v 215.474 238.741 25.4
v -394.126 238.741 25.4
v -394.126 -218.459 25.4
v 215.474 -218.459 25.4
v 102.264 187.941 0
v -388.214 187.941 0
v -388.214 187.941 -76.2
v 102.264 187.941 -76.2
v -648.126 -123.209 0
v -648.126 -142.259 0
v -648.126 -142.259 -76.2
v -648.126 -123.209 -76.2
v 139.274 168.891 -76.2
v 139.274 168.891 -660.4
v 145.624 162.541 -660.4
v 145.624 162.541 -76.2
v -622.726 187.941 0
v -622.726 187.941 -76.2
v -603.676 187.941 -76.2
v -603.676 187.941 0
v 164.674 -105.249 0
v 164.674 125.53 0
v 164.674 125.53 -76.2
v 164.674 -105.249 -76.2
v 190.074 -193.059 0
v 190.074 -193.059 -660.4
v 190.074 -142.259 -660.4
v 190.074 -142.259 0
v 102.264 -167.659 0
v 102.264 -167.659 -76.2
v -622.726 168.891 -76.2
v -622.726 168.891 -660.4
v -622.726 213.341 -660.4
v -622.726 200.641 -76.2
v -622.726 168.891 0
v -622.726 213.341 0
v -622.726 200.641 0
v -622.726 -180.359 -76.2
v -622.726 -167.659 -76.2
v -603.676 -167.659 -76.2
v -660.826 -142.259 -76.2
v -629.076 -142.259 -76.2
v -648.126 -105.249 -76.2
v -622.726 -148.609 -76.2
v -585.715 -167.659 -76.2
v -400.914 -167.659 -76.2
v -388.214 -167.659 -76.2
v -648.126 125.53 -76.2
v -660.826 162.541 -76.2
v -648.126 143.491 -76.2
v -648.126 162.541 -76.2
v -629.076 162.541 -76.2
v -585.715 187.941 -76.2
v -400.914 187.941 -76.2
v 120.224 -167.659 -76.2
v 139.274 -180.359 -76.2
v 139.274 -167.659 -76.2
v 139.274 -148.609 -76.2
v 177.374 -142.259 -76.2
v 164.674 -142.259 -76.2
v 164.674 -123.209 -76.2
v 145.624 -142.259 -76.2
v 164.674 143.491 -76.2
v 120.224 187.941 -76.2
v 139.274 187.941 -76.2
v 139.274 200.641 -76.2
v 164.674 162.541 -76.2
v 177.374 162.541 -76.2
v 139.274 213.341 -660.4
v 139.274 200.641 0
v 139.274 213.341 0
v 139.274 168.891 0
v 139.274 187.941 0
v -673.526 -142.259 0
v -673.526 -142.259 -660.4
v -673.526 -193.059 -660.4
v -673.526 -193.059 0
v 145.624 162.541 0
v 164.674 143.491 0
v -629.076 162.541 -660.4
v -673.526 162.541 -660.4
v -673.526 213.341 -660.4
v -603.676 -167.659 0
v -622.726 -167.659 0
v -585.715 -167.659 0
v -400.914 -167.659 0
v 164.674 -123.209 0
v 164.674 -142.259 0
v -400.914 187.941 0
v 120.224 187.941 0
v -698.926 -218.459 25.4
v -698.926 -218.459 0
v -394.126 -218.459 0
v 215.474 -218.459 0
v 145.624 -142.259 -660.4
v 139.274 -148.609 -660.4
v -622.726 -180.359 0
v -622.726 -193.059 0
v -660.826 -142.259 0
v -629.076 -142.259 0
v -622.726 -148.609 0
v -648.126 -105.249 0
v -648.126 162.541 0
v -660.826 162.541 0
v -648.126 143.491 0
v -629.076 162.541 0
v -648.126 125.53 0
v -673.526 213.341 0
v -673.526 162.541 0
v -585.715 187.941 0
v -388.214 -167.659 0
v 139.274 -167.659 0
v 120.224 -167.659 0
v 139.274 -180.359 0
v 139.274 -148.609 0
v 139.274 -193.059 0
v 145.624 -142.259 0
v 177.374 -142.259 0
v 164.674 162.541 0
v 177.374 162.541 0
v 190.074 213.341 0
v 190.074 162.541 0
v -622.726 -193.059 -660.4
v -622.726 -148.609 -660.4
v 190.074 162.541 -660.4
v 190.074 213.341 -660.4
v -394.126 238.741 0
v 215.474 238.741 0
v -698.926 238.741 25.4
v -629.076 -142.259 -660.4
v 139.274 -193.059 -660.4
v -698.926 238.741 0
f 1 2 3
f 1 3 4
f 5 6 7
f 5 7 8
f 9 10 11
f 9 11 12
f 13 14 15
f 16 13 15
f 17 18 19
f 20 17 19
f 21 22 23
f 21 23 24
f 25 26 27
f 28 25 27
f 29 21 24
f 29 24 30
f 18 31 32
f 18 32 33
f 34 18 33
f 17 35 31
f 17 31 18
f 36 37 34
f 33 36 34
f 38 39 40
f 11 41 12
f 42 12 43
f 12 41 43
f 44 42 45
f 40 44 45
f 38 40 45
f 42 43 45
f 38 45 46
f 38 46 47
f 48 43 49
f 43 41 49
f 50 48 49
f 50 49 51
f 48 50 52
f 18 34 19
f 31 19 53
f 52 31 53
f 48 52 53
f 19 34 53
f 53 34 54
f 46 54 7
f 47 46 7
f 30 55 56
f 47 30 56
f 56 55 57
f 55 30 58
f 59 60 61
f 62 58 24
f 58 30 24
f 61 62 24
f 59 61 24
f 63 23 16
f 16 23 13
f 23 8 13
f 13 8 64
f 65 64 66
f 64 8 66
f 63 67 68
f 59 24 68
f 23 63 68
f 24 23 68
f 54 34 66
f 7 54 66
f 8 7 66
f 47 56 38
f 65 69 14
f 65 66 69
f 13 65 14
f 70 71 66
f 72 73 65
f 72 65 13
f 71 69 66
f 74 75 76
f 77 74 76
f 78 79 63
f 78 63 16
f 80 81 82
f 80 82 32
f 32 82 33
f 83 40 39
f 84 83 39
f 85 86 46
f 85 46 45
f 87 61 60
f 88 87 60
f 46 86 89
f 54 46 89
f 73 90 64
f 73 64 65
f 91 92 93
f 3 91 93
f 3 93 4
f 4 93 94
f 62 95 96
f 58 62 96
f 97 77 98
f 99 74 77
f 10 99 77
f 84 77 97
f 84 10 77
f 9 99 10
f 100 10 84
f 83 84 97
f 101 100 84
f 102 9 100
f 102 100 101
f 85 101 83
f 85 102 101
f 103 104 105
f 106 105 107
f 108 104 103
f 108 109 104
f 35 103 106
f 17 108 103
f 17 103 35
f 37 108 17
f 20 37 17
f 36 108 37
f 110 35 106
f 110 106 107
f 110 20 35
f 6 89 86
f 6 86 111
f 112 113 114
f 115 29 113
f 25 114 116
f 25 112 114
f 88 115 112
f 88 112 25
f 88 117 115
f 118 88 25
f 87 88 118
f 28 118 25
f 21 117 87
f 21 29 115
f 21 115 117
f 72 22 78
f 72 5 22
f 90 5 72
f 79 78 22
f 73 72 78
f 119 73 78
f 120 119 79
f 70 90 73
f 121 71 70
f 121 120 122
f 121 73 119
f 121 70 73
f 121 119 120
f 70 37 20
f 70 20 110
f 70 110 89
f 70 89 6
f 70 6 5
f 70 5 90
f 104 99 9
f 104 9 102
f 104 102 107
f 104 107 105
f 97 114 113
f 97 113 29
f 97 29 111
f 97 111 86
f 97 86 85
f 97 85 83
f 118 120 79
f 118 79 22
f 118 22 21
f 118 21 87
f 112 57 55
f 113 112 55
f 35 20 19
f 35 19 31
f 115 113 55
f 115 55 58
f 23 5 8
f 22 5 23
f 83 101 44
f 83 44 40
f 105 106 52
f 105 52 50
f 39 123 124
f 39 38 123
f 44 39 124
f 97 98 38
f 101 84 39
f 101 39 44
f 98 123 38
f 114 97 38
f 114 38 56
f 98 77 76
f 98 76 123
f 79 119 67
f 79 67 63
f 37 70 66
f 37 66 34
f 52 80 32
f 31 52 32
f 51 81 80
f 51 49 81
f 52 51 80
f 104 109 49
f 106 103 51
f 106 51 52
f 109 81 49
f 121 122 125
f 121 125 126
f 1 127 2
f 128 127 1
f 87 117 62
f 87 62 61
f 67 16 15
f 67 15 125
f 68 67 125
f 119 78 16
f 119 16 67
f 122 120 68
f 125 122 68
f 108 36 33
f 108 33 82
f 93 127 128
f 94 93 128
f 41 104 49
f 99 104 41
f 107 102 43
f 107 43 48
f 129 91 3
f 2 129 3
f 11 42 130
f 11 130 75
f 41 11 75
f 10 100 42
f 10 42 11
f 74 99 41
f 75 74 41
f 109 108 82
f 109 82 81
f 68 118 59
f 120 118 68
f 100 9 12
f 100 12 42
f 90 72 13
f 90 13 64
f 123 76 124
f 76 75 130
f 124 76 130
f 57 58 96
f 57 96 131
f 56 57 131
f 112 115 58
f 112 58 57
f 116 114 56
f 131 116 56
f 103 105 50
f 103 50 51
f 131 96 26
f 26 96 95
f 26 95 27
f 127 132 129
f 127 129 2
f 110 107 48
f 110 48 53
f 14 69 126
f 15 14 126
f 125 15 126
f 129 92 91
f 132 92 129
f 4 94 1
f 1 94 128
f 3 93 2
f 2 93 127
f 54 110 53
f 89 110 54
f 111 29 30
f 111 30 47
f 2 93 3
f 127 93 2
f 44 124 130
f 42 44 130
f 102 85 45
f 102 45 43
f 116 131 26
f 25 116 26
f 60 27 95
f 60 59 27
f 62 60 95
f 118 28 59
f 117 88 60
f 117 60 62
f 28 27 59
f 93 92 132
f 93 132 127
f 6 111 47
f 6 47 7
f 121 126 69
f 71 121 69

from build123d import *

# Parameters (mm, degrees)
F0_W     = 609.6
F0_H     = 457.2
F1_DEPTH = 25.4
F0_W_2   = 304.8
F2_DEPTH = 25.4
F3_W     = 6.7882202148
F3_H     = 355.6
F3_W_2   = 5.9117797852
F4_DEPTH = 76.2
F5_DEPTH = 660.4


with BuildPart() as f1:
    # F0 (on Top) → F1 (new body)
    with BuildSketch(Plane.XY):
        with Locations((-89.3258527756, 10.1408557653)):
            Rectangle(F0_W, F0_H)
    extrude(amount=F1_DEPTH)


with BuildPart() as f2:
    # F0 (on Top) → F2 (new body)
    with BuildSketch(Plane.XY):
        with Locations((-546.5258527756, 10.1408557653)):
            Rectangle(F0_W_2, F0_H)
    extrude(amount=F2_DEPTH)


with BuildPart() as f4:
    # F3 (on face) → F4 (new body)
    with BuildSketch(Plane.XY):
        Polygon((-394.1258527756, -167.6591442347), (-394.1258527756, -180.3591442347), (139.2741472244, -180.3591442347), (139.2741472244, -167.6591442347), (120.2241472244, -167.6591442347), (102.2636349823, -167.6591442347), (-241.7258527756, -167.6591442347), (-388.2140729904, -167.6591442347), align=None)
        Polygon((-622.7258527756, -167.6591442347), (-622.7258527756, -180.3591442347), (-394.1258527756, -180.3591442347), (-394.1258527756, -167.6591442347), (-400.9140729904, -167.6591442347), (-585.7153405334, -167.6591442347), (-603.6758527756, -167.6591442347), align=None)
        Polygon((-622.7258527756, -142.2591442347), (-622.7258527756, -148.6091442347), (-603.6758527756, -167.6591442347), (-585.7153405334, -167.6591442347), (-648.1258527756, -105.2486319925), (-648.1258527756, -123.2091442347), (-629.0758527756, -142.2591442347), align=None)
        Polygon((-660.8258527756, 162.5408557653), (-660.8258527756, -142.2591442347), (-648.1258527756, -142.2591442347), (-648.1258527756, -123.2091442347), (-648.1258527756, -105.2486319925), (-648.1258527756, 125.5303435232), (-648.1258527756, 143.4908557653), (-648.1258527756, 162.5408557653), align=None)
        Polygon((-622.7258527756, 162.5408557653), (-629.0758527756, 162.5408557653), (-648.1258527756, 143.4908557653), (-648.1258527756, 125.5303435232), (-585.7153405334, 187.9408557653), (-603.6758527756, 187.9408557653), (-622.7258527756, 168.8908557653), align=None)
        Polygon((-400.9140729904, 187.9408557653), (-394.1258527756, 187.9408557653), (-394.1258527756, 200.6408557653), (-622.7258527756, 200.6408557653), (-622.7258527756, 187.9408557653), (-603.6758527756, 187.9408557653), (-585.7153405334, 187.9408557653), align=None)
        Polygon((-394.1258527756, 200.6408557653), (-394.1258527756, 187.9408557653), (-388.2140729904, 187.9408557653), (102.2636349823, 187.9408557653), (120.2241472244, 187.9408557653), (139.2741472244, 187.9408557653), (139.2741472244, 200.6408557653), align=None)
        Polygon((120.2241472244, 187.9408557653), (102.2636349823, 187.9408557653), (164.6741472244, 125.5303435232), (164.6741472244, 143.4908557653), (145.6241472244, 162.5408557653), (139.2741472244, 162.5408557653), (139.2741472244, 168.8908557653), align=None)
        Polygon((164.6741472244, -142.2591442347), (177.3741472244, -142.2591442347), (177.3741472244, 162.5408557653), (164.6741472244, 162.5408557653), (164.6741472244, 143.4908557653), (164.6741472244, 125.5303435232), (164.6741472244, -105.2486319925), (164.6741472244, -123.2091442347), align=None)
        Polygon((-629.0758527756, -142.2591442347), (-622.7258527756, -148.6091442347), (-622.7258527756, -142.2591442347), align=None)
        Polygon((-622.7258527756, 168.8908557653), (-629.0758527756, 162.5408557653), (-622.7258527756, 162.5408557653), align=None)
        Polygon((145.6241472244, 162.5408557653), (139.2741472244, 168.8908557653), (139.2741472244, 162.5408557653), align=None)
        Polygon((139.2741472244, -142.2591442347), (139.2741472244, -148.6091442347), (145.6241472244, -142.2591442347), align=None)
        Polygon((120.2241472244, -167.6591442347), (139.2741472244, -148.6091442347), (139.2741472244, -142.2591442347), (145.6241472244, -142.2591442347), (164.6741472244, -123.2091442347), (164.6741472244, -105.2486319925), (102.2636349823, -167.6591442347), align=None)
        with Locations((-397.519962883, 10.1408557653)):
            Rectangle(F3_W, F3_H)
        with Locations((-391.169962883, 10.1408557653)):
            Rectangle(F3_W_2, F3_H)
    extrude(amount=-F4_DEPTH)

    # F3 (on face) → F5 (join)
    with BuildSketch(Plane.XY):
        Polygon((139.2741472244, 213.3408557653), (139.2741472244, 200.6408557653), (139.2741472244, 187.9408557653), (139.2741472244, 168.8908557653), (145.6241472244, 162.5408557653), (164.6741472244, 162.5408557653), (177.3741472244, 162.5408557653), (190.0741472244, 162.5408557653), (190.0741472244, 213.3408557653), align=None)
        Polygon((139.2741472244, -167.6591442347), (139.2741472244, -180.3591442347), (139.2741472244, -193.0591442347), (190.0741472244, -193.0591442347), (190.0741472244, -142.2591442347), (177.3741472244, -142.2591442347), (164.6741472244, -142.2591442347), (145.6241472244, -142.2591442347), (139.2741472244, -148.6091442347), align=None)
        Polygon((-673.5258527756, 162.5408557653), (-660.8258527756, 162.5408557653), (-648.1258527756, 162.5408557653), (-629.0758527756, 162.5408557653), (-622.7258527756, 168.8908557653), (-622.7258527756, 187.9408557653), (-622.7258527756, 200.6408557653), (-622.7258527756, 213.3408557653), (-673.5258527756, 213.3408557653), align=None)
        Polygon((-673.5258527756, -142.2591442347), (-673.5258527756, -193.0591442347), (-622.7258527756, -193.0591442347), (-622.7258527756, -180.3591442347), (-622.7258527756, -167.6591442347), (-622.7258527756, -148.6091442347), (-629.0758527756, -142.2591442347), (-648.1258527756, -142.2591442347), (-660.8258527756, -142.2591442347), align=None)
    extrude(amount=-F5_DEPTH)


solid = Compound([f1.part, f2.part, f4.part])
